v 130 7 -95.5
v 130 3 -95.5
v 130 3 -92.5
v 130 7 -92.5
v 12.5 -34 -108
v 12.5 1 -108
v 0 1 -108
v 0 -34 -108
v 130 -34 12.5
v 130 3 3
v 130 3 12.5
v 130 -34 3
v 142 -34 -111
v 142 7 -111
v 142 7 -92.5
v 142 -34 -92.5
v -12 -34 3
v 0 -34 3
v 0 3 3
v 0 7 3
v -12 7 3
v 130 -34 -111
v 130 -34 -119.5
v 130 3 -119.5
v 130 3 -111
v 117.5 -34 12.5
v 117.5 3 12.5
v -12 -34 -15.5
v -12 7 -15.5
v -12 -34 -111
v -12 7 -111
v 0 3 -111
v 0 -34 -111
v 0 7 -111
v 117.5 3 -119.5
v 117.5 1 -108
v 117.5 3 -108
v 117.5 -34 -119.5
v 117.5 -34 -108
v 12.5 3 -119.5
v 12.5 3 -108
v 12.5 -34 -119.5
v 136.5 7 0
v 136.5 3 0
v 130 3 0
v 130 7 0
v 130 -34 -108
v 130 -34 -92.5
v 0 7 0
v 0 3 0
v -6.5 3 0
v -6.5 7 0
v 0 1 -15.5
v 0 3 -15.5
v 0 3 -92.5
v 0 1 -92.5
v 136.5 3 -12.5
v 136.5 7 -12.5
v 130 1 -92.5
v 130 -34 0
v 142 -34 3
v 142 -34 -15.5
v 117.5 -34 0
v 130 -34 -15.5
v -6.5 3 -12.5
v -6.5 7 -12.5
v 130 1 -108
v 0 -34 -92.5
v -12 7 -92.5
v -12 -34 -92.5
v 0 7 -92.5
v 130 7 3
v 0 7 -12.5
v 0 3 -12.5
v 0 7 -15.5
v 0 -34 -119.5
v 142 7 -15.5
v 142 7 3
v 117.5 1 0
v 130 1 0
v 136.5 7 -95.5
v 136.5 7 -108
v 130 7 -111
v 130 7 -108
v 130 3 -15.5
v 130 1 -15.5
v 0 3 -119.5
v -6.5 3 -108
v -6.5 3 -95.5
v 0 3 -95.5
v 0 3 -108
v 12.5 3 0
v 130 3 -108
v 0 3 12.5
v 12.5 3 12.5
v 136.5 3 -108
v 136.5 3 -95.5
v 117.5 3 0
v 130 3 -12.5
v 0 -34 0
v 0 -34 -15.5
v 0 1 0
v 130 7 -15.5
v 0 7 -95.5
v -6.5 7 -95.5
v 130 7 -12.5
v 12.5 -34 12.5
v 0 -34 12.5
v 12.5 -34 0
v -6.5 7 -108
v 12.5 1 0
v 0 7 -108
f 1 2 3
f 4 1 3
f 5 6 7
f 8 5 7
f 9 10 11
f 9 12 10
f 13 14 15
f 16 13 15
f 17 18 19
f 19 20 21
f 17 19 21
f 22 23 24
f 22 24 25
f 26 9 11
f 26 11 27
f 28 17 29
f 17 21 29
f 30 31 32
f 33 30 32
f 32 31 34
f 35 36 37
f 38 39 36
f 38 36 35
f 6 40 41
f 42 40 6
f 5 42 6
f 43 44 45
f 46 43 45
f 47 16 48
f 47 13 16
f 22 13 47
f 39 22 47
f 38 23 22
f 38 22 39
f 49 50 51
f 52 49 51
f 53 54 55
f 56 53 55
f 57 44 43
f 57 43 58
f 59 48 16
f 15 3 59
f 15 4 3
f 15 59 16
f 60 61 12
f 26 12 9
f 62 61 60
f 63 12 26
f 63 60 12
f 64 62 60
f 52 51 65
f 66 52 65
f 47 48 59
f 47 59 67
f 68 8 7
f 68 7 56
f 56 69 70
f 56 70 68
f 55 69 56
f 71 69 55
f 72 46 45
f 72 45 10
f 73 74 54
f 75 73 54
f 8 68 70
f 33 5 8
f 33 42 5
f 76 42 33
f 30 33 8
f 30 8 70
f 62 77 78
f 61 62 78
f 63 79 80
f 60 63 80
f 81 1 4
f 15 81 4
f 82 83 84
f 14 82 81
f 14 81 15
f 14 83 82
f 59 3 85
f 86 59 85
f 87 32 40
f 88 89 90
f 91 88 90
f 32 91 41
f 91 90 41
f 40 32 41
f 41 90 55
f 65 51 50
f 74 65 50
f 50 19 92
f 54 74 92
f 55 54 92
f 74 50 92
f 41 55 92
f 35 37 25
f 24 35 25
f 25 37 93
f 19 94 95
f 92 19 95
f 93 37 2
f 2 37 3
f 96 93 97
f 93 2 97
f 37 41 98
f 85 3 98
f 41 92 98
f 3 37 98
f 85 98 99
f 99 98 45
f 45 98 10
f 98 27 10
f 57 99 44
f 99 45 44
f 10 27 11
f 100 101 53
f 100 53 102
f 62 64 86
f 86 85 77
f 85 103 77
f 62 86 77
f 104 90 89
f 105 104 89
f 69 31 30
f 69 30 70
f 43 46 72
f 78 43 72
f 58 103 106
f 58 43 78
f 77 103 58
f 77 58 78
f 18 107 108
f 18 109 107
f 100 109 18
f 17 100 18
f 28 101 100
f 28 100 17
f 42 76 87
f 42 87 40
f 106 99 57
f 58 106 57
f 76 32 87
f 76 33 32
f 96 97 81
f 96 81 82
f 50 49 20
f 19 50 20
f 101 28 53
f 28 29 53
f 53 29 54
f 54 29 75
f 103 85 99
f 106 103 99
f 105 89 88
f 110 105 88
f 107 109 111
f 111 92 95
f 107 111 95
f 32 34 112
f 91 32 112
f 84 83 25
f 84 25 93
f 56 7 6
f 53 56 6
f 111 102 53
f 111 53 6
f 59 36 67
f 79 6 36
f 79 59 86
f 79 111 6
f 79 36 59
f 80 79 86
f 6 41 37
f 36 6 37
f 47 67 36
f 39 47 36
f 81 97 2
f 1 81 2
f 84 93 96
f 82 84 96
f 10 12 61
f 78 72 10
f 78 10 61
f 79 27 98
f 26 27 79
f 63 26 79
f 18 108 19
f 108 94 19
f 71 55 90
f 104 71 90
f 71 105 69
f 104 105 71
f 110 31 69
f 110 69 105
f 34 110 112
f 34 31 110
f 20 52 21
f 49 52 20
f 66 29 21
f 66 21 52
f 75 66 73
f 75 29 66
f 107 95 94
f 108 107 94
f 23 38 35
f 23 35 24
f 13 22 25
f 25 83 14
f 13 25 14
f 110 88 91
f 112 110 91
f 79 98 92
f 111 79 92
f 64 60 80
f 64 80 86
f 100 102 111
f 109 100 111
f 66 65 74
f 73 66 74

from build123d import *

# Parameters (mm, degrees)
SKETCH9_W           = 5.5
SKETCH9_H           = 12.5
BOSS_EXTRUDE1_DEPTH = 4
SKETCH11_W          = 6.5
SKETCH11_H          = 12.5
SKETCH11_W_2        = 12
SKETCH11_H_2        = 18.5
BOSS_EXTRUDE2_DEPTH = 2
BOSS_EXTRUDE3_DEPTH = 2
BOSS_EXTRUDE4_DEPTH = 35


with BuildPart() as part:
    # Sketch9 → Boss-Extrude1 (new body)
    with BuildSketch(Plane(origin=(0, 3, 0), x_dir=(1, 0, 0), z_dir=(0, 1, 0))):
        Polygon((0, -3), (0, 0), (-6.5, 0), (-12, 0), (-12, -3), align=None)
        with Locations((-9.25, 6.25)):
            Rectangle(SKETCH9_W, SKETCH9_H)
        Polygon((-6.5, 12.5), (0, 12.5), (0, 15.5), (-12, 15.5), (-12, 12.5), align=None)
        Polygon((130, 15.5), (130, 12.5), (136.5, 12.5), (142, 12.5), (142, 15.5), align=None)
        with Locations((139.25, 6.25)):
            Rectangle(SKETCH9_W, SKETCH9_H)
        Polygon((136.5, 0), (130, 0), (130, -3), (142, -3), (142, 0), align=None)
        Polygon((136.5, 95.5), (130, 95.5), (130, 92.5), (142, 92.5), (142, 95.5), align=None)
        with Locations((139.25, 101.75)):
            Rectangle(SKETCH9_W, SKETCH9_H)
        Polygon((130, 111), (130, 108), (136.5, 108), (142, 108), (142, 111), align=None)
        Polygon((0, 92.5), (0, 95.5), (-6.5, 95.5), (-12, 95.5), (-12, 92.5), align=None)
        with Locations((-9.25, 101.75)):
            Rectangle(SKETCH9_W, SKETCH9_H)
        Polygon((-6.5, 108), (0, 108), (0, 111), (-12, 111), (-12, 108), align=None)
    extrude(amount=BOSS_EXTRUDE1_DEPTH)

    # Sketch11 → Boss-Extrude2 (add)
    with BuildSketch(Plane.XZ.offset(-3)):
        Polygon((130, 0), (0, 0), (0, -12.5), (0, -15.5), (0, -92.5), (0, -108), (130, -108), (130, -92.5), (130, -15.5), align=None)
        with Locations((-3.25, -6.25)):
            Rectangle(SKETCH11_W, SKETCH11_H)
        Polygon((-6.5, -12.5), (-6.5, 0), (0, 0), (0, 3), (-12, 3), (-12, -15.5), (0, -15.5), (0, -12.5), align=None)
        with Locations((136, -6.25)):
            Rectangle(SKETCH11_W_2, SKETCH11_H_2)
        with Locations((136, -101.75)):
            Rectangle(SKETCH11_W_2, SKETCH11_H_2)
        with Locations((-6, -101.75)):
            Rectangle(SKETCH11_W_2, SKETCH11_H_2)
    extrude(amount=BOSS_EXTRUDE2_DEPTH)

    # Sketch12 → Boss-Extrude3 (add)
    with BuildSketch(Plane.XZ.offset(-1)):
        Polygon((12.5, -119.5), (12.5, -108), (0, -108), (0, -111), (0, -119.5), align=None)
        Polygon((0, 0), (12.5, 0), (12.5, 12.5), (0, 12.5), (0, 3), align=None)
        Polygon((117.5, 0), (130, 0), (130, 3), (130, 12.5), (117.5, 12.5), align=None)
        Polygon((130, -111), (130, -108), (117.5, -108), (117.5, -119.5), (130, -119.5), align=None)
    extrude(amount=-BOSS_EXTRUDE3_DEPTH)

    # Sketch13 → Boss-Extrude4 (add)
    with BuildSketch(Plane(origin=(0, 1, 0), x_dir=(-1, 0, 0), z_dir=(0, -1, 0))):
        Polygon((-12.5, -12.5), (0, -12.5), (0, -3), (0, 0), (-12.5, 0), align=None)
        Polygon((0, 0), (0, -3), (12, -3), (12, 15.5), (0, 15.5), align=None)
        Polygon((-117.5, -12.5), (-117.5, 0), (-130, 0), (-130, -3), (-130, -12.5), align=None)
        Polygon((-130, -3), (-130, 0), (-130, 15.5), (-142, 15.5), (-142, -3), align=None)
        Polygon((-142, 92.5), (-130, 92.5), (-130, 108), (-130, 111), (-142, 111), align=None)
        Polygon((-130, 111), (-130, 108), (-117.5, 108), (-117.5, 119.5), (-130, 119.5), align=None)
        Polygon((-12.5, 108), (0, 108), (0, 111), (0, 119.5), (-12.5, 119.5), align=None)
        Polygon((0, 108), (0, 92.5), (12, 92.5), (12, 111), (0, 111), align=None)
    extrude(amount=BOSS_EXTRUDE4_DEPTH)


solid = part.part
